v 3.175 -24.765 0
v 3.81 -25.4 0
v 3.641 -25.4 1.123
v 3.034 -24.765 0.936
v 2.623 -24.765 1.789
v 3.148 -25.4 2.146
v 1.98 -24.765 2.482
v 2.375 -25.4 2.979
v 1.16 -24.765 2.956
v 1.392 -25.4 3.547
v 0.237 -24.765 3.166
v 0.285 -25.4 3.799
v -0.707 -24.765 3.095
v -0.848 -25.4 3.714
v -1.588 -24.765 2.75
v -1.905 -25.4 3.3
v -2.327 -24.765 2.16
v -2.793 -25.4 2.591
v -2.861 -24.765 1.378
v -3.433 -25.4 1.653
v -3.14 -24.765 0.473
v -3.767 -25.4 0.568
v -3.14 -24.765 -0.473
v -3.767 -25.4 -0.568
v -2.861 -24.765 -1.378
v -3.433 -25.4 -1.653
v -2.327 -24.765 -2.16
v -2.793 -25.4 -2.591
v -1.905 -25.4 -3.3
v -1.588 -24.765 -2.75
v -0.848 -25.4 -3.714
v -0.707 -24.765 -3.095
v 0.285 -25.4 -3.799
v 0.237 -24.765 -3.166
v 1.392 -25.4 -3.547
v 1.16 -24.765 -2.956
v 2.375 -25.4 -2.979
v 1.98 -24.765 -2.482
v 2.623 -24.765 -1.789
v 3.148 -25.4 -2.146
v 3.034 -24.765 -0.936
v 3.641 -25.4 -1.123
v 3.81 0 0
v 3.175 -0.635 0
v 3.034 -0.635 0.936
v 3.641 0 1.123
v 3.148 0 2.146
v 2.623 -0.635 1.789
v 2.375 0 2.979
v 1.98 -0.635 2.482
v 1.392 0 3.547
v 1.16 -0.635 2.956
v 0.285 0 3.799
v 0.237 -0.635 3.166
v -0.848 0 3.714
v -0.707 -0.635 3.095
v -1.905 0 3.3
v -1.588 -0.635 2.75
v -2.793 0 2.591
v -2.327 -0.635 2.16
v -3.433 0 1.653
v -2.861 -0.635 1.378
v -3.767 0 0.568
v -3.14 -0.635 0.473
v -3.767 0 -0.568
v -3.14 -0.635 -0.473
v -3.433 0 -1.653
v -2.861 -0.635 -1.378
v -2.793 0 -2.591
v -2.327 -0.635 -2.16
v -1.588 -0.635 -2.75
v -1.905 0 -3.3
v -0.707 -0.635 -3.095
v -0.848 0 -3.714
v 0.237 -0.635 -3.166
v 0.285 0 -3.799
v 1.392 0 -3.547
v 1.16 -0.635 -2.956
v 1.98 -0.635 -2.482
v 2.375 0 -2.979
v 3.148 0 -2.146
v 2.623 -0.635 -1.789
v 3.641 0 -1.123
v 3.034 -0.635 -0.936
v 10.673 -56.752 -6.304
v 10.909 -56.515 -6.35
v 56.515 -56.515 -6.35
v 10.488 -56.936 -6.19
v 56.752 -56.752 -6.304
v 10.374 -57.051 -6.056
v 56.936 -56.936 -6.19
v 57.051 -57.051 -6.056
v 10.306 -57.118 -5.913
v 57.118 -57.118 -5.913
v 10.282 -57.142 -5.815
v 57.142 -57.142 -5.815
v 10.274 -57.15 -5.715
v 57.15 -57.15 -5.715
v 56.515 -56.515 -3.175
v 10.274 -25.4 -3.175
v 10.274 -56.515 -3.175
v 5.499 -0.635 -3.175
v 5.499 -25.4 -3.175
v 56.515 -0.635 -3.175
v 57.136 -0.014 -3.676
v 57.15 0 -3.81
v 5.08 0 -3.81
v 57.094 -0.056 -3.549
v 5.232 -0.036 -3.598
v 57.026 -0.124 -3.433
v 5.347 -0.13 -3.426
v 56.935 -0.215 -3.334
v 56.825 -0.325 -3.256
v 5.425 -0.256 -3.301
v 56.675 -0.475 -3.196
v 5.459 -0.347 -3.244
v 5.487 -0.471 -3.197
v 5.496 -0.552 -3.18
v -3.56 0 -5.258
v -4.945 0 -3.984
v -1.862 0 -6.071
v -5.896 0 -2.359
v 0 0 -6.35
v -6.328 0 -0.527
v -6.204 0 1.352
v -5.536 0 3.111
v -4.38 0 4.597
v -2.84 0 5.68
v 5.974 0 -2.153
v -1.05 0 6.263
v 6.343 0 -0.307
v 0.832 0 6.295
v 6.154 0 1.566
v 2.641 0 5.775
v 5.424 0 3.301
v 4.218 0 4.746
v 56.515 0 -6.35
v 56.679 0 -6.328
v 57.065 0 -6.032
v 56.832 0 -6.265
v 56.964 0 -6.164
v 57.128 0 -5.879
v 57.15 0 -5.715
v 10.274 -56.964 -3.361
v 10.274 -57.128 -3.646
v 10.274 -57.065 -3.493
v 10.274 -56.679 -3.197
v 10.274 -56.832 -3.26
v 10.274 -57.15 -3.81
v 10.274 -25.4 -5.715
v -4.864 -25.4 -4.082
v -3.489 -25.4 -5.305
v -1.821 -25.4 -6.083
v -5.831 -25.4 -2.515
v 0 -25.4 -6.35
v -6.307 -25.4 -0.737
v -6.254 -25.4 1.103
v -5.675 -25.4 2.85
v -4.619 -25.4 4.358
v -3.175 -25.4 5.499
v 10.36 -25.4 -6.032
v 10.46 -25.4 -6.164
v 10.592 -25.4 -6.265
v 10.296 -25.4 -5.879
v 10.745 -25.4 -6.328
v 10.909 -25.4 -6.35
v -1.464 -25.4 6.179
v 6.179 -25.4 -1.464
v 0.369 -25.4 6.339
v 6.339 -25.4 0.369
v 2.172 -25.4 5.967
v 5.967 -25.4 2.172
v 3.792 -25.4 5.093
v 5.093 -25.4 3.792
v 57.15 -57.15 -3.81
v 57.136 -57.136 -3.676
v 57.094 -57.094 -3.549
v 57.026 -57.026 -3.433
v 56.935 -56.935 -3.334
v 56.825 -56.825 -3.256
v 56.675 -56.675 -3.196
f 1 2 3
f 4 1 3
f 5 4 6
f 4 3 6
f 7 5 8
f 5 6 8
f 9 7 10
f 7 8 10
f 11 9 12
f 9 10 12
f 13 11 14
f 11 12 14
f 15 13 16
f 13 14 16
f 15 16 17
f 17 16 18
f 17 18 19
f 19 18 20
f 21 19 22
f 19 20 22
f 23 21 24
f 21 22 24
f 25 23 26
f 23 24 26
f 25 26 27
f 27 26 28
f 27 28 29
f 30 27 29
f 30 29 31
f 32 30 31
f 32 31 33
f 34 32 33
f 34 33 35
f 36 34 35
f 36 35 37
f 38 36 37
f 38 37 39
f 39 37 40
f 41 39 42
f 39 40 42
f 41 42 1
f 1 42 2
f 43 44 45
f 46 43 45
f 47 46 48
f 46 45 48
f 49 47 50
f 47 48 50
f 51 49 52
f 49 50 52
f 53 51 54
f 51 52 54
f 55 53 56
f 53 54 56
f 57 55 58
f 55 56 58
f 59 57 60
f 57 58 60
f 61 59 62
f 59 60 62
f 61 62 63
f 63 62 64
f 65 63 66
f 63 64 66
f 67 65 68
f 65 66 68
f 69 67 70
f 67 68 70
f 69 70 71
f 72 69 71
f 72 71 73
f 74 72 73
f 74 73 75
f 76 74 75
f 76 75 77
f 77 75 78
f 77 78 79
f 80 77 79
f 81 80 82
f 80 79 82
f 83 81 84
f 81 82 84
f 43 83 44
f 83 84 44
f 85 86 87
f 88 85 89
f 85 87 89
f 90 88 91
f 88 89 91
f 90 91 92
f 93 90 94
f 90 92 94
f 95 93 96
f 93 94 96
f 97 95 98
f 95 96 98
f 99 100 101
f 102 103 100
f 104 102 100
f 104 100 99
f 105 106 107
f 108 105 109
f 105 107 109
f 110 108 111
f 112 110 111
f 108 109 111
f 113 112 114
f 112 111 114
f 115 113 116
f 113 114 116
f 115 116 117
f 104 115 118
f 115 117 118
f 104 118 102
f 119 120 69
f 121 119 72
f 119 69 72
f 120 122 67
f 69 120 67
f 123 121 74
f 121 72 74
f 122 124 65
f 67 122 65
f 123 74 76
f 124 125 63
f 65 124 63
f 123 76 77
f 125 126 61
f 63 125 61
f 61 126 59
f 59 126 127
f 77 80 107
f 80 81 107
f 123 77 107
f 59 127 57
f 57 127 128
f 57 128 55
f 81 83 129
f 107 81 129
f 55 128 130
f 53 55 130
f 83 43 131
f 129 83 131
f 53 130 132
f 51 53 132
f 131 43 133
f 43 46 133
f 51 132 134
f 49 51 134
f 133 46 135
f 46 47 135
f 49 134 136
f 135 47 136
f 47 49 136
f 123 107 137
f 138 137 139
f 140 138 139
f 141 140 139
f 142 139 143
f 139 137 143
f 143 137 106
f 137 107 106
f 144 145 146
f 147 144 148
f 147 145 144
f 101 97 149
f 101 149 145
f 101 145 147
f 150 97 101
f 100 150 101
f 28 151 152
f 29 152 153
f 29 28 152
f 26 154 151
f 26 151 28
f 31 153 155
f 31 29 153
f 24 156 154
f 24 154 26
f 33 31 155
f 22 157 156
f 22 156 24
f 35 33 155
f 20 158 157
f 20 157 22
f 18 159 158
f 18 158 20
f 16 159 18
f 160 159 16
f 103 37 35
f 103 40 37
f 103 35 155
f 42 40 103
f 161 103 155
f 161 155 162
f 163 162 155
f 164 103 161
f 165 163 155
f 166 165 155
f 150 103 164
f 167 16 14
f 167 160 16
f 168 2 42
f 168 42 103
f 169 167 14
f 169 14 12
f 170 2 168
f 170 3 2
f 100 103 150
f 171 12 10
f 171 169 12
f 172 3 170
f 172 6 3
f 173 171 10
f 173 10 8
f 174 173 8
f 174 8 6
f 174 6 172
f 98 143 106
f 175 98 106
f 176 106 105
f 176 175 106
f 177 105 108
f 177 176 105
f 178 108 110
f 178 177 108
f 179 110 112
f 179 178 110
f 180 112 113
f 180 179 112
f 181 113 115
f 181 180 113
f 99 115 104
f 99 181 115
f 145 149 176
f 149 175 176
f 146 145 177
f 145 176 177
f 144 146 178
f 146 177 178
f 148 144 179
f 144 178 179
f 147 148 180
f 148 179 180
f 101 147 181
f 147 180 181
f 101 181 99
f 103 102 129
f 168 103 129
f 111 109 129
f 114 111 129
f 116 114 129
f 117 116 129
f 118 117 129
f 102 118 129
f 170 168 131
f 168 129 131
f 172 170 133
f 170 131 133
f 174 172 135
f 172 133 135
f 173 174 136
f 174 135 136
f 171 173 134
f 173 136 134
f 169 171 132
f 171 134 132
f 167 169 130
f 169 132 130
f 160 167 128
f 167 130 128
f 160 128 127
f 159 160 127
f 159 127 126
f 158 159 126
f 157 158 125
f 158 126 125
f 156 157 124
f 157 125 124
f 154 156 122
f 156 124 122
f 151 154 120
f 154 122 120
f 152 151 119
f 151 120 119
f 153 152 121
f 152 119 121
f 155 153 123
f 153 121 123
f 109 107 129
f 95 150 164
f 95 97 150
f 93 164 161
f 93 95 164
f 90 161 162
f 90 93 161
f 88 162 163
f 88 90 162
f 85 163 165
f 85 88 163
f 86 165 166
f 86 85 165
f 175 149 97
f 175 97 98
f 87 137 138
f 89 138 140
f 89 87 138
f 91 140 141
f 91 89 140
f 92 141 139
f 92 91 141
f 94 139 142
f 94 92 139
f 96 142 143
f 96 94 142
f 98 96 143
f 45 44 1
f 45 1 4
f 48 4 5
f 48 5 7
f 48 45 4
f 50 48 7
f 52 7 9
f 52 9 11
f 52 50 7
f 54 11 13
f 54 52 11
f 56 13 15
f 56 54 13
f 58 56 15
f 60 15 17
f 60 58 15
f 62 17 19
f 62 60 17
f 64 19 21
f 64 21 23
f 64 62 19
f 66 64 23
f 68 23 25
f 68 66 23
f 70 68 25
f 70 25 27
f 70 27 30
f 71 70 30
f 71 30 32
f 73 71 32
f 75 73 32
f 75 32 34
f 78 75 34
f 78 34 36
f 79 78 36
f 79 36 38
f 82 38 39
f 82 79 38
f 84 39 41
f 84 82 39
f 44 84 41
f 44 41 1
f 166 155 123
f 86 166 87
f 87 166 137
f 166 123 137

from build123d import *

# Parameters (mm, degrees)
F0_R     = 3.175
F1_DEPTH = 25.4
F0_W     = 46.875538686
F0_H     = 3.175
F2_DEPTH = 57.15
F3_R     = 0.635
F4_SIZE  = 0.635


with BuildPart() as f1:
    # F0 (on Front) → F1 (new body)
    with BuildSketch(Plane.XZ):
        with BuildLine():
            ThreePointArc((5.499261314, -3.175), (-3.175, 5.499261314), (0, -6.35))
            Line((0, -6.35), (10.274461314, -6.35))
            Line((10.274461314, -6.35), (10.274461314, -3.175))
            Line((10.274461314, -3.175), (5.499261314, -3.175))
        make_face()
        Circle(F0_R, mode=Mode.SUBTRACT)
    extrude(amount=F1_DEPTH)

    # F0 (on Front) → F2 (join)
    with BuildSketch(Plane.XZ):
        with Locations((33.712230657, -4.7625)):
            Rectangle(F0_W, F0_H)
    extrude(amount=F2_DEPTH)

    # F3
    f3_edges = [f1.edges().sort_by_distance(p)[0] for p in [
        (33.712231, -57.15, -3.175),
        (33.712231, -57.15, -6.35),
        (57.15, -28.575, -3.175),
        (57.15, -28.575, -6.35),
        (31.324631, 0, -3.175),
        (10.274461, -41.275, -6.35),
    ]]
    fillet(f3_edges, radius=F3_R)

    # F4
    f4_edges = [f1.edges().sort_by_distance(p)[0] for p in [
        (-3.175, -25.4, 0),
        (-3.175, 0, 0),
    ]]
    chamfer(f4_edges, length=F4_SIZE)


solid = f1.part
